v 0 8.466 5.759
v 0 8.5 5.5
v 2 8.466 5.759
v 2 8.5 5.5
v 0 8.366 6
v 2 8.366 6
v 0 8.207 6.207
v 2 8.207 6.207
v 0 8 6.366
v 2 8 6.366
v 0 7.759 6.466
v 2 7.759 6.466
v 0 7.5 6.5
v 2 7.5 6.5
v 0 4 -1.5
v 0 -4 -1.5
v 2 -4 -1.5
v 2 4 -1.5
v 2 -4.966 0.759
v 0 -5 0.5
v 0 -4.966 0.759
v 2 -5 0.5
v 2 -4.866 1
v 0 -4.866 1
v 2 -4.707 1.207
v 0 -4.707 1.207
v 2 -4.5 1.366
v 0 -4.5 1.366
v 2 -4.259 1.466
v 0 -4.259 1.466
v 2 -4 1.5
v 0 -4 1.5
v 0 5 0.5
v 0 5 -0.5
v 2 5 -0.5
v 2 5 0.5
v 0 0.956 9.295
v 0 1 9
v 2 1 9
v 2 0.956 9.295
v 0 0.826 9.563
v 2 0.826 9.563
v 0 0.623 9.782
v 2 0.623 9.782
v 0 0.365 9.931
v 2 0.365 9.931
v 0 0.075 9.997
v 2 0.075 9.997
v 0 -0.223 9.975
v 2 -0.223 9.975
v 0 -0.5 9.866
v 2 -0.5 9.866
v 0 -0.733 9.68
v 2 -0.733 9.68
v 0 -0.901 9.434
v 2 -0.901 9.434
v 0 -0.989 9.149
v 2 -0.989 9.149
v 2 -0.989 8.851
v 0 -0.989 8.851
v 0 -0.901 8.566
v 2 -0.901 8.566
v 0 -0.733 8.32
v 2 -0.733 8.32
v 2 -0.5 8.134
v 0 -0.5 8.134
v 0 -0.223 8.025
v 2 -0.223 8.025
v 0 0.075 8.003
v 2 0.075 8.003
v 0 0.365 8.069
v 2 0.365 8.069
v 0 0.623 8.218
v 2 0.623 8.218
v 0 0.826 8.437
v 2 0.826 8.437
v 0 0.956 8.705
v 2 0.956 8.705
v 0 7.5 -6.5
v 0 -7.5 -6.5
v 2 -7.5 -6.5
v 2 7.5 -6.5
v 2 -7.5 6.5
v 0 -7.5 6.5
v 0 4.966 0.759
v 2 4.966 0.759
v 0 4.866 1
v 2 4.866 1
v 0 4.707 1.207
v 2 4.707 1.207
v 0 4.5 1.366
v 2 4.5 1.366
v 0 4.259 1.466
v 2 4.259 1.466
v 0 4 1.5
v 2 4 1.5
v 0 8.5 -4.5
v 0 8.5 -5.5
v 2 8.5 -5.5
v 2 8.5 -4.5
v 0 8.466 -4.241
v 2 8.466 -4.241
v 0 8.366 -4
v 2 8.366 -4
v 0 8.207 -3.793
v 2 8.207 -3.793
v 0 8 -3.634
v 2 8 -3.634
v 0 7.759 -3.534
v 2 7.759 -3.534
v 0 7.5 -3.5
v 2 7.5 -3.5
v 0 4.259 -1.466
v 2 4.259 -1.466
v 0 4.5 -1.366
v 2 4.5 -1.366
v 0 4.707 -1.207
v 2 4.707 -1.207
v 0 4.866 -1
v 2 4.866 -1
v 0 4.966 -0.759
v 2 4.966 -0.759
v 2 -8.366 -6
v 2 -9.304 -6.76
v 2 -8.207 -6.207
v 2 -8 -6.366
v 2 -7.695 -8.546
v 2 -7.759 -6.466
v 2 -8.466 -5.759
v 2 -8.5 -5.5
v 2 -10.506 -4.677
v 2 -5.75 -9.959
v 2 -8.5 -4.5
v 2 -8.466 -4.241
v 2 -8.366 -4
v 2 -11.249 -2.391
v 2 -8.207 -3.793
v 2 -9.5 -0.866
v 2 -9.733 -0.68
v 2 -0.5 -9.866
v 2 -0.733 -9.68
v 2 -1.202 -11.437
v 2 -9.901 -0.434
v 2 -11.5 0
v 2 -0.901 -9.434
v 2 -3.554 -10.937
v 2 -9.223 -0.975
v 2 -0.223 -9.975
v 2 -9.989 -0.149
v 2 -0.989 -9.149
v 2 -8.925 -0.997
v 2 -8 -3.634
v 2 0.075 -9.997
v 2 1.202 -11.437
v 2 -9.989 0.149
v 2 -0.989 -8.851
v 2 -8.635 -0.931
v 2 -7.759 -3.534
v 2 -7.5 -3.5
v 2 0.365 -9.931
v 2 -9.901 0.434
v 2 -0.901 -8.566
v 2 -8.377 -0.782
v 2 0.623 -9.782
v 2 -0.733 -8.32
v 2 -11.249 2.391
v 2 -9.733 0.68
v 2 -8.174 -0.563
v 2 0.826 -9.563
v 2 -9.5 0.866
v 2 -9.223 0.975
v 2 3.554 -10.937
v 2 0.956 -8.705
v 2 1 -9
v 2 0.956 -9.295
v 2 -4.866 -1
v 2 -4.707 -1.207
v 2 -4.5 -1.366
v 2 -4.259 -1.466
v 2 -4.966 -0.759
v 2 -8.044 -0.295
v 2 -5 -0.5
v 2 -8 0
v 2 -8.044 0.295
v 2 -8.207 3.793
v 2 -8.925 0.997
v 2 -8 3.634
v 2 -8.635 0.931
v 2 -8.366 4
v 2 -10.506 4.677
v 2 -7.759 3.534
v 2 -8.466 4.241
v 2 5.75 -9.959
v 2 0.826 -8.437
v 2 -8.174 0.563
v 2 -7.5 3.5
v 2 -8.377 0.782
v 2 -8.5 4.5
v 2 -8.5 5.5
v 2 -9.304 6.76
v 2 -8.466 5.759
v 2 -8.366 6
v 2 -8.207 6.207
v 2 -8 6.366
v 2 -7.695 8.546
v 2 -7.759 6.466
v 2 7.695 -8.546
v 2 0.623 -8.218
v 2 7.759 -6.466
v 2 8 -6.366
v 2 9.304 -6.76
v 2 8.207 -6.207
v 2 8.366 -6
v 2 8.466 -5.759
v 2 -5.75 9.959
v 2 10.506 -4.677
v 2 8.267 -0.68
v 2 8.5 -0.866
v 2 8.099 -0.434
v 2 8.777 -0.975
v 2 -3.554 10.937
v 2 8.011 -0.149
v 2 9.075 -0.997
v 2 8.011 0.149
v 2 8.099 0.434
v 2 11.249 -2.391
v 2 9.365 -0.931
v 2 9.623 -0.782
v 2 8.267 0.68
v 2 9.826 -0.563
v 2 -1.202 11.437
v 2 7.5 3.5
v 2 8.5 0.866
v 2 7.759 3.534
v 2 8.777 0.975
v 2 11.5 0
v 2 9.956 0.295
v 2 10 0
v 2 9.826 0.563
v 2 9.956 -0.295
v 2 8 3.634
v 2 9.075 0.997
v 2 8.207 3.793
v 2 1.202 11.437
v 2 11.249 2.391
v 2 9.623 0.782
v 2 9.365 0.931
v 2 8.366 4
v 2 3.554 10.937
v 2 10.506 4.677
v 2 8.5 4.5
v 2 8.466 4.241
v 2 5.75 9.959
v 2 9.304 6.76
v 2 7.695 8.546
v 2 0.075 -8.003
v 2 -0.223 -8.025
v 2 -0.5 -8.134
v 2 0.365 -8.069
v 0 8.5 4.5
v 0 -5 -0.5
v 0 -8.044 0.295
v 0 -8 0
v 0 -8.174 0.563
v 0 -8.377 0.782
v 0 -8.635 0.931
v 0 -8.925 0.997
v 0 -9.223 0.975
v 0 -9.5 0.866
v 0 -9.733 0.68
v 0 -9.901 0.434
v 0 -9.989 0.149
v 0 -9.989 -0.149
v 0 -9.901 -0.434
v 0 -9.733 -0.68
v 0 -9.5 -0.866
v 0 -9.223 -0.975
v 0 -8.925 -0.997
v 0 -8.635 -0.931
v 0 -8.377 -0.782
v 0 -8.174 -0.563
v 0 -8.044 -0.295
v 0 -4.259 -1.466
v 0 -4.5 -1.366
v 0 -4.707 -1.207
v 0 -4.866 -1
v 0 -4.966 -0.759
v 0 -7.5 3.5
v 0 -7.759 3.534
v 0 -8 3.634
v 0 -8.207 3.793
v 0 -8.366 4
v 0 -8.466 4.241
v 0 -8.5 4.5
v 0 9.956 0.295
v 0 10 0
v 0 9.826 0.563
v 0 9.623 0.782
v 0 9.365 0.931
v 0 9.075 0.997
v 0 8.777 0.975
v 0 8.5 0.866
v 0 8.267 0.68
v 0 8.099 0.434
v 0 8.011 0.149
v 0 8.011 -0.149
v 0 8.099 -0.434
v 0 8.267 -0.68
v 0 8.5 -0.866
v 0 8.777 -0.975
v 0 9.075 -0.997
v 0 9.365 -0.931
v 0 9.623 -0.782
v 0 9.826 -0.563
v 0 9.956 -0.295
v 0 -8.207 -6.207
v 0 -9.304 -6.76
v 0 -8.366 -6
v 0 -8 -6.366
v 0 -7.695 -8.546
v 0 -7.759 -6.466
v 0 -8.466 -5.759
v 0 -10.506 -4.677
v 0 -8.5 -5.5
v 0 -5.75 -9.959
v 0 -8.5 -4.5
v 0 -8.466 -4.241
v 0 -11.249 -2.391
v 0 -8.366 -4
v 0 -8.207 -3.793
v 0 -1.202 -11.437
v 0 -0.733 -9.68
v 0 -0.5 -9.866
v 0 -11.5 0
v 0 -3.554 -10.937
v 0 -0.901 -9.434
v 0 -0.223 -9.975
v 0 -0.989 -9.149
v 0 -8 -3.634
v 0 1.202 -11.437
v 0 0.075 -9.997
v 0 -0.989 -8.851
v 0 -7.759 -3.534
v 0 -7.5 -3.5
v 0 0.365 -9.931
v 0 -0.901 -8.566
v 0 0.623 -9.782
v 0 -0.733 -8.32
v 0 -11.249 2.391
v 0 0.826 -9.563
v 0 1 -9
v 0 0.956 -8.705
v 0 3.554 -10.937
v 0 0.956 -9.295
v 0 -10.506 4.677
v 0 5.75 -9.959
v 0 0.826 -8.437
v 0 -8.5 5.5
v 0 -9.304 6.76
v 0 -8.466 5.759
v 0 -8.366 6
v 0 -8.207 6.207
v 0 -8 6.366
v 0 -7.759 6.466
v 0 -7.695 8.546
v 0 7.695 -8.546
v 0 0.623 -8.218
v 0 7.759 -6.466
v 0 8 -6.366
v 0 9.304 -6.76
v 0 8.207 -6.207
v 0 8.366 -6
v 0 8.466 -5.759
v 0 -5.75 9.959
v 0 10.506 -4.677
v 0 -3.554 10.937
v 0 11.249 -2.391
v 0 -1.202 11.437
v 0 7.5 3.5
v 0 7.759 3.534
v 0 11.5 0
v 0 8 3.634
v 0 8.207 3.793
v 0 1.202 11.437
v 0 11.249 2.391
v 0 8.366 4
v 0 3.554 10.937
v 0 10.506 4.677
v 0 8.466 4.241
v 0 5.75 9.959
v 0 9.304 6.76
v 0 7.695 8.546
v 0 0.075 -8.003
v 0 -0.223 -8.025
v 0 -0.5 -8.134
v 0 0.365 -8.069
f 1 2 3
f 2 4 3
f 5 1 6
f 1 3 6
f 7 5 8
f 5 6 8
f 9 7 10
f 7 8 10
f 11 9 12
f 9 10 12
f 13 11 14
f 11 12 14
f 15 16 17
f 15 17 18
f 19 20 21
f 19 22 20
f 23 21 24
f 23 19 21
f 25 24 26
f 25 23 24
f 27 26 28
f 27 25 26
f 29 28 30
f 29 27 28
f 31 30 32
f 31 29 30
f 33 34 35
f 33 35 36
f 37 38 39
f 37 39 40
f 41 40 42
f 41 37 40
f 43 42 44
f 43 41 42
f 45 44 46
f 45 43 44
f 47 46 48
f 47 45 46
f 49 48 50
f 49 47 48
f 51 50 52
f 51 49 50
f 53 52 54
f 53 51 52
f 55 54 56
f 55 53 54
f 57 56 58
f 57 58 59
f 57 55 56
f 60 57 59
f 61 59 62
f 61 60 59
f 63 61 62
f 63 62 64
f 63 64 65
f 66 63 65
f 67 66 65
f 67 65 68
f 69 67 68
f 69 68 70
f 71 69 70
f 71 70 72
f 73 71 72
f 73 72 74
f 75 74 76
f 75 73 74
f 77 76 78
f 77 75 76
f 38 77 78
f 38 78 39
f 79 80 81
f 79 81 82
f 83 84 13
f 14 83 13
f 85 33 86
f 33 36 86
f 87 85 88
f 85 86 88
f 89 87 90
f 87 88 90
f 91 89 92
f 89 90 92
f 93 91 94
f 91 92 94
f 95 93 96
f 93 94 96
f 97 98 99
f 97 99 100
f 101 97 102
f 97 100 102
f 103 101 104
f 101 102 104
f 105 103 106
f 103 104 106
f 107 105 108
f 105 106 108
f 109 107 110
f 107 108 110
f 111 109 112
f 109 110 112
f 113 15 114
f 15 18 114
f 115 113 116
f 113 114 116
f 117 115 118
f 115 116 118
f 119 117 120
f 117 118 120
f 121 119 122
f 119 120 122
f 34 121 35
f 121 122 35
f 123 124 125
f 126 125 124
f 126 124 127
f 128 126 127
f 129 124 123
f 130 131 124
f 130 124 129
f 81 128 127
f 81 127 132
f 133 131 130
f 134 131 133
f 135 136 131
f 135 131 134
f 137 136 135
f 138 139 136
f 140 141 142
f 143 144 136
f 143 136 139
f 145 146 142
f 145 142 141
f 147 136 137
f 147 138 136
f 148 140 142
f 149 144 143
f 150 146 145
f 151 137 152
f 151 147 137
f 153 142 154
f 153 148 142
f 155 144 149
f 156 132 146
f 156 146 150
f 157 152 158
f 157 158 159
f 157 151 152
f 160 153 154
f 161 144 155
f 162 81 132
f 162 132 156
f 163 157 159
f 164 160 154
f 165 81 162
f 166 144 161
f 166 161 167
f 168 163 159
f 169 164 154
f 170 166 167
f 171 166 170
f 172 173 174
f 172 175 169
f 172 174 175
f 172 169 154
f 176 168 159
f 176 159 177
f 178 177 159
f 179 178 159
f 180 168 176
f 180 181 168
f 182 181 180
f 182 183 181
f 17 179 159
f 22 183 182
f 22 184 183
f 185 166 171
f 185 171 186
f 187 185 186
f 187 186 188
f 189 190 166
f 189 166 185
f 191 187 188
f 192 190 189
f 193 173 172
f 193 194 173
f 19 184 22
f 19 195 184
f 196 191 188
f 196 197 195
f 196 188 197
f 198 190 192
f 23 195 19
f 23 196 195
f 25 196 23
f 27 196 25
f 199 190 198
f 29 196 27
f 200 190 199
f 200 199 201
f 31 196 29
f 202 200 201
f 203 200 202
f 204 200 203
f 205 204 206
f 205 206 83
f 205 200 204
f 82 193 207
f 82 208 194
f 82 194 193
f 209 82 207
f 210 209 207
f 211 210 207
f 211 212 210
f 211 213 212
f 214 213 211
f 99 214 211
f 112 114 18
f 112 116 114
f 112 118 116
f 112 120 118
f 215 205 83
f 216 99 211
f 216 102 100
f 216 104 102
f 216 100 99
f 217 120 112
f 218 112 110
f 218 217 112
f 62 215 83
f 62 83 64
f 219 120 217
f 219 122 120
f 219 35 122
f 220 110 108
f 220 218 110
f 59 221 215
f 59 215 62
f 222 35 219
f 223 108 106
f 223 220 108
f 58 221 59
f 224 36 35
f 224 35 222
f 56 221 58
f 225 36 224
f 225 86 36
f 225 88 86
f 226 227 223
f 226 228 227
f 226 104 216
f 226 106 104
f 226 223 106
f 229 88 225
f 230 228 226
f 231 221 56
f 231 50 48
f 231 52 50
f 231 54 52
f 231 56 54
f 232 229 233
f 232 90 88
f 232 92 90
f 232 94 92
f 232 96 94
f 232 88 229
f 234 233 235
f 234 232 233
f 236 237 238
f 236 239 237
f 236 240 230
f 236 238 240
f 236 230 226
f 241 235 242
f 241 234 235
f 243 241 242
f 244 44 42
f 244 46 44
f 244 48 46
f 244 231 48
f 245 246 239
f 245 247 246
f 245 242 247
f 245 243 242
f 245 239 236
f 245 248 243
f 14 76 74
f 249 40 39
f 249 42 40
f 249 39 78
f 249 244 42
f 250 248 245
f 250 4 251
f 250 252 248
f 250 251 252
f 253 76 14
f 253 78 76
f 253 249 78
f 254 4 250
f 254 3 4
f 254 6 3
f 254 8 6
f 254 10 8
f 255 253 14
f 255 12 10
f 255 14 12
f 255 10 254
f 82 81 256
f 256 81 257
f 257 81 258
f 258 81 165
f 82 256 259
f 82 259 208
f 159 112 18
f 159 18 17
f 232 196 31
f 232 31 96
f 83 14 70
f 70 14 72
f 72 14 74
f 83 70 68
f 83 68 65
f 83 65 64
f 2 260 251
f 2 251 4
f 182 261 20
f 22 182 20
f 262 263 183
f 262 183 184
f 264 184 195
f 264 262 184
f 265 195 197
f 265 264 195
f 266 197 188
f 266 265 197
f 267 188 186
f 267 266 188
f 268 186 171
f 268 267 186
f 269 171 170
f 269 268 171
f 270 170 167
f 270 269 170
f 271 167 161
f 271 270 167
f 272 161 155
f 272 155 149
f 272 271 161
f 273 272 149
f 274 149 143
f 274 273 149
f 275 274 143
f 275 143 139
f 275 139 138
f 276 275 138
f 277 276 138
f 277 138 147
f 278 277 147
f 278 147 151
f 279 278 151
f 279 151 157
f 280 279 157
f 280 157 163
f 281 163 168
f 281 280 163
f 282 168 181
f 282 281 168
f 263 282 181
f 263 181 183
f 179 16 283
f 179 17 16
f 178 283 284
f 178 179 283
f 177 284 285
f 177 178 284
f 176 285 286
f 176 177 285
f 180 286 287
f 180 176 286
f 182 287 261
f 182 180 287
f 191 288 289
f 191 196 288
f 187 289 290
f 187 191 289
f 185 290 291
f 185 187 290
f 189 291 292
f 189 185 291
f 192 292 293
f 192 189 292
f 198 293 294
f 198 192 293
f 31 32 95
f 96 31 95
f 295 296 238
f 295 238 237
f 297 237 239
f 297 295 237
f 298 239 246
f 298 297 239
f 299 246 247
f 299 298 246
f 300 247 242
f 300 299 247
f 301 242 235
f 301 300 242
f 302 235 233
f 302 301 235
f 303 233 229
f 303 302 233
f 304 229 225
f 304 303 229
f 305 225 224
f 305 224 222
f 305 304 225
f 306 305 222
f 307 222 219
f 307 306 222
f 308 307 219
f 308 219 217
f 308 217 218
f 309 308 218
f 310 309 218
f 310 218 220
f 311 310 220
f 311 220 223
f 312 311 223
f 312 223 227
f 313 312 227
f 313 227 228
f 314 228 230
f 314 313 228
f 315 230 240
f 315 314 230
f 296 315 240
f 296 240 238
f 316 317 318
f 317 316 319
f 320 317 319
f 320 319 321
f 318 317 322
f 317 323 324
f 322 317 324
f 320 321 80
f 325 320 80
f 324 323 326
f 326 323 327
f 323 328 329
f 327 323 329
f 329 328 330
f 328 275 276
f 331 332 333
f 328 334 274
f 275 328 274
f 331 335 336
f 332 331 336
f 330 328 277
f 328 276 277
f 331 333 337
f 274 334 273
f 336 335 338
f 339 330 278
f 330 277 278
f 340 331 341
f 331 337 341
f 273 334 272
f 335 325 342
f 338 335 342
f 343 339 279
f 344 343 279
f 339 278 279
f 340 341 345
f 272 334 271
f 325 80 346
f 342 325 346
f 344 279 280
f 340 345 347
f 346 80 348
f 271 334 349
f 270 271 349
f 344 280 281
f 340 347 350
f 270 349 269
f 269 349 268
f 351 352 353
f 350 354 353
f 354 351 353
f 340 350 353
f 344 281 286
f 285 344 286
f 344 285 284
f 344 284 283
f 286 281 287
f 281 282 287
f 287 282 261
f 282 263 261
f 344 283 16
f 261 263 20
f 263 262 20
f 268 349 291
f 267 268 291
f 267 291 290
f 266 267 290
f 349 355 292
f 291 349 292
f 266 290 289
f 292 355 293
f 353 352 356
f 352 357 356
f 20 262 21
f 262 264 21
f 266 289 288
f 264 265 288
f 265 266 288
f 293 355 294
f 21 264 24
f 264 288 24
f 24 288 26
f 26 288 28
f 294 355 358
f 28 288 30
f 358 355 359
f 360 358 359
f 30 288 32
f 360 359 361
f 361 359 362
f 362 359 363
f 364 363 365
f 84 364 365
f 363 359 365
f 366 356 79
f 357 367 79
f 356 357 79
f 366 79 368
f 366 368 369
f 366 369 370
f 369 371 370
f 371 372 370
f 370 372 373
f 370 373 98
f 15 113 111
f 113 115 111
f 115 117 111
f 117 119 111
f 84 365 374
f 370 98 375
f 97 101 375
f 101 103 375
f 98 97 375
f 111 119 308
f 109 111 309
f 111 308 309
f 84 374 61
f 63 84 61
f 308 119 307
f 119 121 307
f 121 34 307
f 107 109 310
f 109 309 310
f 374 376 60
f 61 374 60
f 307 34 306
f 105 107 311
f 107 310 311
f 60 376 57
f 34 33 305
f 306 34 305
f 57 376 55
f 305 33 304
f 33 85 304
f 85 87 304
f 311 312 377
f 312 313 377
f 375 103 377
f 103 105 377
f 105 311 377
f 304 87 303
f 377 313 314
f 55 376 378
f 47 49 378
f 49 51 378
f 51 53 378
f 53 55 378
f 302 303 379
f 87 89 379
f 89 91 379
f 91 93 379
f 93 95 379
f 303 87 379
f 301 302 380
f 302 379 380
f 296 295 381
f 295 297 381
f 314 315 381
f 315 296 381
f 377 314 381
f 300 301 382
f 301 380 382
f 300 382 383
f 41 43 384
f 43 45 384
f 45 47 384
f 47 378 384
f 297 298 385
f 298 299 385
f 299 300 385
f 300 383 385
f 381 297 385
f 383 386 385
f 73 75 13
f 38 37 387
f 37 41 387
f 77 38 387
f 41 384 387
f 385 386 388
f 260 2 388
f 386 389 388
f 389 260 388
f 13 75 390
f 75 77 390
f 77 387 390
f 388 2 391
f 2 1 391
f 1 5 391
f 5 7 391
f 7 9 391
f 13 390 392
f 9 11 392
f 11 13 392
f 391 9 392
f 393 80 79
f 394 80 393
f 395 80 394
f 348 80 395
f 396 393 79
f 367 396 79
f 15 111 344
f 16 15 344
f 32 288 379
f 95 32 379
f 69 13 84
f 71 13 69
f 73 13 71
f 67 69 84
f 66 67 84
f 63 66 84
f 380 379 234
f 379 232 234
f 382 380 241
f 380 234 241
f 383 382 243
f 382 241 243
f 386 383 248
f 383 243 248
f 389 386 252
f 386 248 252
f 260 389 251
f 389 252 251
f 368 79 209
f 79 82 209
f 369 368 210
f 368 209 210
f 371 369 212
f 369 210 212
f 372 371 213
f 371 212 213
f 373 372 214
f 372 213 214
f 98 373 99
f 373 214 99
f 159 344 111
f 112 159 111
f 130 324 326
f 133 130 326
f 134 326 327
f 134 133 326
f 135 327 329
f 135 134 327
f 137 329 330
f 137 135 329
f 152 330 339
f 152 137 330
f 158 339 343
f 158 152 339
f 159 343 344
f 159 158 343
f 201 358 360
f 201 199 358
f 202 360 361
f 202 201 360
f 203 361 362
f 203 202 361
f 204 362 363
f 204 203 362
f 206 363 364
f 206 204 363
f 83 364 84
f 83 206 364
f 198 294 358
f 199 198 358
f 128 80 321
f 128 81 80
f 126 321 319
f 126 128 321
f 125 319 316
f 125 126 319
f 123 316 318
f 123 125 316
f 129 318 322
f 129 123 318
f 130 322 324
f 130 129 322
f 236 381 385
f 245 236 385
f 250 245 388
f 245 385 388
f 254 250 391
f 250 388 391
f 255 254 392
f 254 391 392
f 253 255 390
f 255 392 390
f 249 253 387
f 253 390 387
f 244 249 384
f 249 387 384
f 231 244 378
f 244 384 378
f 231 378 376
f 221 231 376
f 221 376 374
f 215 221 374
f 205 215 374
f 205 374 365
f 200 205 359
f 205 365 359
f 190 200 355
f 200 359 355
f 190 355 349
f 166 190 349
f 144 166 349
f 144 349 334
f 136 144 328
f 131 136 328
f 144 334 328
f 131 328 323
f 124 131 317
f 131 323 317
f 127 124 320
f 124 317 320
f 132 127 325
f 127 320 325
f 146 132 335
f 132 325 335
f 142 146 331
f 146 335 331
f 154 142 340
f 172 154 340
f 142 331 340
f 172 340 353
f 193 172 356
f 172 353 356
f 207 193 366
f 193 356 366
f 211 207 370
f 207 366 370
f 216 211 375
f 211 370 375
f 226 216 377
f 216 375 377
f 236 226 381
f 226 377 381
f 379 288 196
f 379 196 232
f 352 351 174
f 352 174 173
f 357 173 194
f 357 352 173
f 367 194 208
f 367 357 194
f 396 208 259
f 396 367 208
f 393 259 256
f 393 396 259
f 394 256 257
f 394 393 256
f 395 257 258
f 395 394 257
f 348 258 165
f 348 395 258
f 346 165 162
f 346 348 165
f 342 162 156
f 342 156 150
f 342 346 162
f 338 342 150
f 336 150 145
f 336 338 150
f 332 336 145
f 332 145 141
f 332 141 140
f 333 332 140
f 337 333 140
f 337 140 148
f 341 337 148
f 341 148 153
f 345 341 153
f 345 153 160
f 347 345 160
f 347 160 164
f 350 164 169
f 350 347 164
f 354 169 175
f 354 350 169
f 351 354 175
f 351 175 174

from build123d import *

# Parameters (mm, degrees)
F0_R     = 11.5
F0_R_2   = 1
F0_W     = 17
F0_H     = 3
F0_W_2   = 10
F1_DEPTH = 2
F2_R     = 1


with BuildPart() as f1:
    # F0 (on Right) → F1 (new body)
    with BuildSketch(Plane.YZ):
        Circle(F0_R)
        with Locations((0, -9)):
            Circle(F0_R_2, mode=Mode.SUBTRACT)
        with Locations((0, -5)):
            Rectangle(F0_W, F0_H, mode=Mode.SUBTRACT)
        with Locations((-9, 0)):
            Circle(F0_R_2, mode=Mode.SUBTRACT)
        Rectangle(F0_W_2, F0_H, mode=Mode.SUBTRACT)
        with Locations((0, 5)):
            Rectangle(F0_W, F0_H, mode=Mode.SUBTRACT)
        with Locations((9, 0)):
            Circle(F0_R_2, mode=Mode.SUBTRACT)
        with Locations((0, 9)):
            Circle(F0_R_2, mode=Mode.SUBTRACT)
    extrude(amount=F1_DEPTH)

    # F2
    f2_edges = [f1.edges().sort_by_distance(p)[0] for p in [
        (1, -8.5, 6.5),
        (1, -8.5, 3.5),
        (1, 8.5, 6.5),
        (1, 8.5, 3.5),
        (1, 5, -1.5),
        (1, -5, -1.5),
        (1, -8.5, -6.5),
        (1, 8.5, -6.5),
        (1, -5, 1.5),
        (1, -8.5, -3.5),
        (1, 8.5, -3.5),
        (1, 5, 1.5),
    ]]
    fillet(f2_edges, radius=F2_R)


solid = f1.part
